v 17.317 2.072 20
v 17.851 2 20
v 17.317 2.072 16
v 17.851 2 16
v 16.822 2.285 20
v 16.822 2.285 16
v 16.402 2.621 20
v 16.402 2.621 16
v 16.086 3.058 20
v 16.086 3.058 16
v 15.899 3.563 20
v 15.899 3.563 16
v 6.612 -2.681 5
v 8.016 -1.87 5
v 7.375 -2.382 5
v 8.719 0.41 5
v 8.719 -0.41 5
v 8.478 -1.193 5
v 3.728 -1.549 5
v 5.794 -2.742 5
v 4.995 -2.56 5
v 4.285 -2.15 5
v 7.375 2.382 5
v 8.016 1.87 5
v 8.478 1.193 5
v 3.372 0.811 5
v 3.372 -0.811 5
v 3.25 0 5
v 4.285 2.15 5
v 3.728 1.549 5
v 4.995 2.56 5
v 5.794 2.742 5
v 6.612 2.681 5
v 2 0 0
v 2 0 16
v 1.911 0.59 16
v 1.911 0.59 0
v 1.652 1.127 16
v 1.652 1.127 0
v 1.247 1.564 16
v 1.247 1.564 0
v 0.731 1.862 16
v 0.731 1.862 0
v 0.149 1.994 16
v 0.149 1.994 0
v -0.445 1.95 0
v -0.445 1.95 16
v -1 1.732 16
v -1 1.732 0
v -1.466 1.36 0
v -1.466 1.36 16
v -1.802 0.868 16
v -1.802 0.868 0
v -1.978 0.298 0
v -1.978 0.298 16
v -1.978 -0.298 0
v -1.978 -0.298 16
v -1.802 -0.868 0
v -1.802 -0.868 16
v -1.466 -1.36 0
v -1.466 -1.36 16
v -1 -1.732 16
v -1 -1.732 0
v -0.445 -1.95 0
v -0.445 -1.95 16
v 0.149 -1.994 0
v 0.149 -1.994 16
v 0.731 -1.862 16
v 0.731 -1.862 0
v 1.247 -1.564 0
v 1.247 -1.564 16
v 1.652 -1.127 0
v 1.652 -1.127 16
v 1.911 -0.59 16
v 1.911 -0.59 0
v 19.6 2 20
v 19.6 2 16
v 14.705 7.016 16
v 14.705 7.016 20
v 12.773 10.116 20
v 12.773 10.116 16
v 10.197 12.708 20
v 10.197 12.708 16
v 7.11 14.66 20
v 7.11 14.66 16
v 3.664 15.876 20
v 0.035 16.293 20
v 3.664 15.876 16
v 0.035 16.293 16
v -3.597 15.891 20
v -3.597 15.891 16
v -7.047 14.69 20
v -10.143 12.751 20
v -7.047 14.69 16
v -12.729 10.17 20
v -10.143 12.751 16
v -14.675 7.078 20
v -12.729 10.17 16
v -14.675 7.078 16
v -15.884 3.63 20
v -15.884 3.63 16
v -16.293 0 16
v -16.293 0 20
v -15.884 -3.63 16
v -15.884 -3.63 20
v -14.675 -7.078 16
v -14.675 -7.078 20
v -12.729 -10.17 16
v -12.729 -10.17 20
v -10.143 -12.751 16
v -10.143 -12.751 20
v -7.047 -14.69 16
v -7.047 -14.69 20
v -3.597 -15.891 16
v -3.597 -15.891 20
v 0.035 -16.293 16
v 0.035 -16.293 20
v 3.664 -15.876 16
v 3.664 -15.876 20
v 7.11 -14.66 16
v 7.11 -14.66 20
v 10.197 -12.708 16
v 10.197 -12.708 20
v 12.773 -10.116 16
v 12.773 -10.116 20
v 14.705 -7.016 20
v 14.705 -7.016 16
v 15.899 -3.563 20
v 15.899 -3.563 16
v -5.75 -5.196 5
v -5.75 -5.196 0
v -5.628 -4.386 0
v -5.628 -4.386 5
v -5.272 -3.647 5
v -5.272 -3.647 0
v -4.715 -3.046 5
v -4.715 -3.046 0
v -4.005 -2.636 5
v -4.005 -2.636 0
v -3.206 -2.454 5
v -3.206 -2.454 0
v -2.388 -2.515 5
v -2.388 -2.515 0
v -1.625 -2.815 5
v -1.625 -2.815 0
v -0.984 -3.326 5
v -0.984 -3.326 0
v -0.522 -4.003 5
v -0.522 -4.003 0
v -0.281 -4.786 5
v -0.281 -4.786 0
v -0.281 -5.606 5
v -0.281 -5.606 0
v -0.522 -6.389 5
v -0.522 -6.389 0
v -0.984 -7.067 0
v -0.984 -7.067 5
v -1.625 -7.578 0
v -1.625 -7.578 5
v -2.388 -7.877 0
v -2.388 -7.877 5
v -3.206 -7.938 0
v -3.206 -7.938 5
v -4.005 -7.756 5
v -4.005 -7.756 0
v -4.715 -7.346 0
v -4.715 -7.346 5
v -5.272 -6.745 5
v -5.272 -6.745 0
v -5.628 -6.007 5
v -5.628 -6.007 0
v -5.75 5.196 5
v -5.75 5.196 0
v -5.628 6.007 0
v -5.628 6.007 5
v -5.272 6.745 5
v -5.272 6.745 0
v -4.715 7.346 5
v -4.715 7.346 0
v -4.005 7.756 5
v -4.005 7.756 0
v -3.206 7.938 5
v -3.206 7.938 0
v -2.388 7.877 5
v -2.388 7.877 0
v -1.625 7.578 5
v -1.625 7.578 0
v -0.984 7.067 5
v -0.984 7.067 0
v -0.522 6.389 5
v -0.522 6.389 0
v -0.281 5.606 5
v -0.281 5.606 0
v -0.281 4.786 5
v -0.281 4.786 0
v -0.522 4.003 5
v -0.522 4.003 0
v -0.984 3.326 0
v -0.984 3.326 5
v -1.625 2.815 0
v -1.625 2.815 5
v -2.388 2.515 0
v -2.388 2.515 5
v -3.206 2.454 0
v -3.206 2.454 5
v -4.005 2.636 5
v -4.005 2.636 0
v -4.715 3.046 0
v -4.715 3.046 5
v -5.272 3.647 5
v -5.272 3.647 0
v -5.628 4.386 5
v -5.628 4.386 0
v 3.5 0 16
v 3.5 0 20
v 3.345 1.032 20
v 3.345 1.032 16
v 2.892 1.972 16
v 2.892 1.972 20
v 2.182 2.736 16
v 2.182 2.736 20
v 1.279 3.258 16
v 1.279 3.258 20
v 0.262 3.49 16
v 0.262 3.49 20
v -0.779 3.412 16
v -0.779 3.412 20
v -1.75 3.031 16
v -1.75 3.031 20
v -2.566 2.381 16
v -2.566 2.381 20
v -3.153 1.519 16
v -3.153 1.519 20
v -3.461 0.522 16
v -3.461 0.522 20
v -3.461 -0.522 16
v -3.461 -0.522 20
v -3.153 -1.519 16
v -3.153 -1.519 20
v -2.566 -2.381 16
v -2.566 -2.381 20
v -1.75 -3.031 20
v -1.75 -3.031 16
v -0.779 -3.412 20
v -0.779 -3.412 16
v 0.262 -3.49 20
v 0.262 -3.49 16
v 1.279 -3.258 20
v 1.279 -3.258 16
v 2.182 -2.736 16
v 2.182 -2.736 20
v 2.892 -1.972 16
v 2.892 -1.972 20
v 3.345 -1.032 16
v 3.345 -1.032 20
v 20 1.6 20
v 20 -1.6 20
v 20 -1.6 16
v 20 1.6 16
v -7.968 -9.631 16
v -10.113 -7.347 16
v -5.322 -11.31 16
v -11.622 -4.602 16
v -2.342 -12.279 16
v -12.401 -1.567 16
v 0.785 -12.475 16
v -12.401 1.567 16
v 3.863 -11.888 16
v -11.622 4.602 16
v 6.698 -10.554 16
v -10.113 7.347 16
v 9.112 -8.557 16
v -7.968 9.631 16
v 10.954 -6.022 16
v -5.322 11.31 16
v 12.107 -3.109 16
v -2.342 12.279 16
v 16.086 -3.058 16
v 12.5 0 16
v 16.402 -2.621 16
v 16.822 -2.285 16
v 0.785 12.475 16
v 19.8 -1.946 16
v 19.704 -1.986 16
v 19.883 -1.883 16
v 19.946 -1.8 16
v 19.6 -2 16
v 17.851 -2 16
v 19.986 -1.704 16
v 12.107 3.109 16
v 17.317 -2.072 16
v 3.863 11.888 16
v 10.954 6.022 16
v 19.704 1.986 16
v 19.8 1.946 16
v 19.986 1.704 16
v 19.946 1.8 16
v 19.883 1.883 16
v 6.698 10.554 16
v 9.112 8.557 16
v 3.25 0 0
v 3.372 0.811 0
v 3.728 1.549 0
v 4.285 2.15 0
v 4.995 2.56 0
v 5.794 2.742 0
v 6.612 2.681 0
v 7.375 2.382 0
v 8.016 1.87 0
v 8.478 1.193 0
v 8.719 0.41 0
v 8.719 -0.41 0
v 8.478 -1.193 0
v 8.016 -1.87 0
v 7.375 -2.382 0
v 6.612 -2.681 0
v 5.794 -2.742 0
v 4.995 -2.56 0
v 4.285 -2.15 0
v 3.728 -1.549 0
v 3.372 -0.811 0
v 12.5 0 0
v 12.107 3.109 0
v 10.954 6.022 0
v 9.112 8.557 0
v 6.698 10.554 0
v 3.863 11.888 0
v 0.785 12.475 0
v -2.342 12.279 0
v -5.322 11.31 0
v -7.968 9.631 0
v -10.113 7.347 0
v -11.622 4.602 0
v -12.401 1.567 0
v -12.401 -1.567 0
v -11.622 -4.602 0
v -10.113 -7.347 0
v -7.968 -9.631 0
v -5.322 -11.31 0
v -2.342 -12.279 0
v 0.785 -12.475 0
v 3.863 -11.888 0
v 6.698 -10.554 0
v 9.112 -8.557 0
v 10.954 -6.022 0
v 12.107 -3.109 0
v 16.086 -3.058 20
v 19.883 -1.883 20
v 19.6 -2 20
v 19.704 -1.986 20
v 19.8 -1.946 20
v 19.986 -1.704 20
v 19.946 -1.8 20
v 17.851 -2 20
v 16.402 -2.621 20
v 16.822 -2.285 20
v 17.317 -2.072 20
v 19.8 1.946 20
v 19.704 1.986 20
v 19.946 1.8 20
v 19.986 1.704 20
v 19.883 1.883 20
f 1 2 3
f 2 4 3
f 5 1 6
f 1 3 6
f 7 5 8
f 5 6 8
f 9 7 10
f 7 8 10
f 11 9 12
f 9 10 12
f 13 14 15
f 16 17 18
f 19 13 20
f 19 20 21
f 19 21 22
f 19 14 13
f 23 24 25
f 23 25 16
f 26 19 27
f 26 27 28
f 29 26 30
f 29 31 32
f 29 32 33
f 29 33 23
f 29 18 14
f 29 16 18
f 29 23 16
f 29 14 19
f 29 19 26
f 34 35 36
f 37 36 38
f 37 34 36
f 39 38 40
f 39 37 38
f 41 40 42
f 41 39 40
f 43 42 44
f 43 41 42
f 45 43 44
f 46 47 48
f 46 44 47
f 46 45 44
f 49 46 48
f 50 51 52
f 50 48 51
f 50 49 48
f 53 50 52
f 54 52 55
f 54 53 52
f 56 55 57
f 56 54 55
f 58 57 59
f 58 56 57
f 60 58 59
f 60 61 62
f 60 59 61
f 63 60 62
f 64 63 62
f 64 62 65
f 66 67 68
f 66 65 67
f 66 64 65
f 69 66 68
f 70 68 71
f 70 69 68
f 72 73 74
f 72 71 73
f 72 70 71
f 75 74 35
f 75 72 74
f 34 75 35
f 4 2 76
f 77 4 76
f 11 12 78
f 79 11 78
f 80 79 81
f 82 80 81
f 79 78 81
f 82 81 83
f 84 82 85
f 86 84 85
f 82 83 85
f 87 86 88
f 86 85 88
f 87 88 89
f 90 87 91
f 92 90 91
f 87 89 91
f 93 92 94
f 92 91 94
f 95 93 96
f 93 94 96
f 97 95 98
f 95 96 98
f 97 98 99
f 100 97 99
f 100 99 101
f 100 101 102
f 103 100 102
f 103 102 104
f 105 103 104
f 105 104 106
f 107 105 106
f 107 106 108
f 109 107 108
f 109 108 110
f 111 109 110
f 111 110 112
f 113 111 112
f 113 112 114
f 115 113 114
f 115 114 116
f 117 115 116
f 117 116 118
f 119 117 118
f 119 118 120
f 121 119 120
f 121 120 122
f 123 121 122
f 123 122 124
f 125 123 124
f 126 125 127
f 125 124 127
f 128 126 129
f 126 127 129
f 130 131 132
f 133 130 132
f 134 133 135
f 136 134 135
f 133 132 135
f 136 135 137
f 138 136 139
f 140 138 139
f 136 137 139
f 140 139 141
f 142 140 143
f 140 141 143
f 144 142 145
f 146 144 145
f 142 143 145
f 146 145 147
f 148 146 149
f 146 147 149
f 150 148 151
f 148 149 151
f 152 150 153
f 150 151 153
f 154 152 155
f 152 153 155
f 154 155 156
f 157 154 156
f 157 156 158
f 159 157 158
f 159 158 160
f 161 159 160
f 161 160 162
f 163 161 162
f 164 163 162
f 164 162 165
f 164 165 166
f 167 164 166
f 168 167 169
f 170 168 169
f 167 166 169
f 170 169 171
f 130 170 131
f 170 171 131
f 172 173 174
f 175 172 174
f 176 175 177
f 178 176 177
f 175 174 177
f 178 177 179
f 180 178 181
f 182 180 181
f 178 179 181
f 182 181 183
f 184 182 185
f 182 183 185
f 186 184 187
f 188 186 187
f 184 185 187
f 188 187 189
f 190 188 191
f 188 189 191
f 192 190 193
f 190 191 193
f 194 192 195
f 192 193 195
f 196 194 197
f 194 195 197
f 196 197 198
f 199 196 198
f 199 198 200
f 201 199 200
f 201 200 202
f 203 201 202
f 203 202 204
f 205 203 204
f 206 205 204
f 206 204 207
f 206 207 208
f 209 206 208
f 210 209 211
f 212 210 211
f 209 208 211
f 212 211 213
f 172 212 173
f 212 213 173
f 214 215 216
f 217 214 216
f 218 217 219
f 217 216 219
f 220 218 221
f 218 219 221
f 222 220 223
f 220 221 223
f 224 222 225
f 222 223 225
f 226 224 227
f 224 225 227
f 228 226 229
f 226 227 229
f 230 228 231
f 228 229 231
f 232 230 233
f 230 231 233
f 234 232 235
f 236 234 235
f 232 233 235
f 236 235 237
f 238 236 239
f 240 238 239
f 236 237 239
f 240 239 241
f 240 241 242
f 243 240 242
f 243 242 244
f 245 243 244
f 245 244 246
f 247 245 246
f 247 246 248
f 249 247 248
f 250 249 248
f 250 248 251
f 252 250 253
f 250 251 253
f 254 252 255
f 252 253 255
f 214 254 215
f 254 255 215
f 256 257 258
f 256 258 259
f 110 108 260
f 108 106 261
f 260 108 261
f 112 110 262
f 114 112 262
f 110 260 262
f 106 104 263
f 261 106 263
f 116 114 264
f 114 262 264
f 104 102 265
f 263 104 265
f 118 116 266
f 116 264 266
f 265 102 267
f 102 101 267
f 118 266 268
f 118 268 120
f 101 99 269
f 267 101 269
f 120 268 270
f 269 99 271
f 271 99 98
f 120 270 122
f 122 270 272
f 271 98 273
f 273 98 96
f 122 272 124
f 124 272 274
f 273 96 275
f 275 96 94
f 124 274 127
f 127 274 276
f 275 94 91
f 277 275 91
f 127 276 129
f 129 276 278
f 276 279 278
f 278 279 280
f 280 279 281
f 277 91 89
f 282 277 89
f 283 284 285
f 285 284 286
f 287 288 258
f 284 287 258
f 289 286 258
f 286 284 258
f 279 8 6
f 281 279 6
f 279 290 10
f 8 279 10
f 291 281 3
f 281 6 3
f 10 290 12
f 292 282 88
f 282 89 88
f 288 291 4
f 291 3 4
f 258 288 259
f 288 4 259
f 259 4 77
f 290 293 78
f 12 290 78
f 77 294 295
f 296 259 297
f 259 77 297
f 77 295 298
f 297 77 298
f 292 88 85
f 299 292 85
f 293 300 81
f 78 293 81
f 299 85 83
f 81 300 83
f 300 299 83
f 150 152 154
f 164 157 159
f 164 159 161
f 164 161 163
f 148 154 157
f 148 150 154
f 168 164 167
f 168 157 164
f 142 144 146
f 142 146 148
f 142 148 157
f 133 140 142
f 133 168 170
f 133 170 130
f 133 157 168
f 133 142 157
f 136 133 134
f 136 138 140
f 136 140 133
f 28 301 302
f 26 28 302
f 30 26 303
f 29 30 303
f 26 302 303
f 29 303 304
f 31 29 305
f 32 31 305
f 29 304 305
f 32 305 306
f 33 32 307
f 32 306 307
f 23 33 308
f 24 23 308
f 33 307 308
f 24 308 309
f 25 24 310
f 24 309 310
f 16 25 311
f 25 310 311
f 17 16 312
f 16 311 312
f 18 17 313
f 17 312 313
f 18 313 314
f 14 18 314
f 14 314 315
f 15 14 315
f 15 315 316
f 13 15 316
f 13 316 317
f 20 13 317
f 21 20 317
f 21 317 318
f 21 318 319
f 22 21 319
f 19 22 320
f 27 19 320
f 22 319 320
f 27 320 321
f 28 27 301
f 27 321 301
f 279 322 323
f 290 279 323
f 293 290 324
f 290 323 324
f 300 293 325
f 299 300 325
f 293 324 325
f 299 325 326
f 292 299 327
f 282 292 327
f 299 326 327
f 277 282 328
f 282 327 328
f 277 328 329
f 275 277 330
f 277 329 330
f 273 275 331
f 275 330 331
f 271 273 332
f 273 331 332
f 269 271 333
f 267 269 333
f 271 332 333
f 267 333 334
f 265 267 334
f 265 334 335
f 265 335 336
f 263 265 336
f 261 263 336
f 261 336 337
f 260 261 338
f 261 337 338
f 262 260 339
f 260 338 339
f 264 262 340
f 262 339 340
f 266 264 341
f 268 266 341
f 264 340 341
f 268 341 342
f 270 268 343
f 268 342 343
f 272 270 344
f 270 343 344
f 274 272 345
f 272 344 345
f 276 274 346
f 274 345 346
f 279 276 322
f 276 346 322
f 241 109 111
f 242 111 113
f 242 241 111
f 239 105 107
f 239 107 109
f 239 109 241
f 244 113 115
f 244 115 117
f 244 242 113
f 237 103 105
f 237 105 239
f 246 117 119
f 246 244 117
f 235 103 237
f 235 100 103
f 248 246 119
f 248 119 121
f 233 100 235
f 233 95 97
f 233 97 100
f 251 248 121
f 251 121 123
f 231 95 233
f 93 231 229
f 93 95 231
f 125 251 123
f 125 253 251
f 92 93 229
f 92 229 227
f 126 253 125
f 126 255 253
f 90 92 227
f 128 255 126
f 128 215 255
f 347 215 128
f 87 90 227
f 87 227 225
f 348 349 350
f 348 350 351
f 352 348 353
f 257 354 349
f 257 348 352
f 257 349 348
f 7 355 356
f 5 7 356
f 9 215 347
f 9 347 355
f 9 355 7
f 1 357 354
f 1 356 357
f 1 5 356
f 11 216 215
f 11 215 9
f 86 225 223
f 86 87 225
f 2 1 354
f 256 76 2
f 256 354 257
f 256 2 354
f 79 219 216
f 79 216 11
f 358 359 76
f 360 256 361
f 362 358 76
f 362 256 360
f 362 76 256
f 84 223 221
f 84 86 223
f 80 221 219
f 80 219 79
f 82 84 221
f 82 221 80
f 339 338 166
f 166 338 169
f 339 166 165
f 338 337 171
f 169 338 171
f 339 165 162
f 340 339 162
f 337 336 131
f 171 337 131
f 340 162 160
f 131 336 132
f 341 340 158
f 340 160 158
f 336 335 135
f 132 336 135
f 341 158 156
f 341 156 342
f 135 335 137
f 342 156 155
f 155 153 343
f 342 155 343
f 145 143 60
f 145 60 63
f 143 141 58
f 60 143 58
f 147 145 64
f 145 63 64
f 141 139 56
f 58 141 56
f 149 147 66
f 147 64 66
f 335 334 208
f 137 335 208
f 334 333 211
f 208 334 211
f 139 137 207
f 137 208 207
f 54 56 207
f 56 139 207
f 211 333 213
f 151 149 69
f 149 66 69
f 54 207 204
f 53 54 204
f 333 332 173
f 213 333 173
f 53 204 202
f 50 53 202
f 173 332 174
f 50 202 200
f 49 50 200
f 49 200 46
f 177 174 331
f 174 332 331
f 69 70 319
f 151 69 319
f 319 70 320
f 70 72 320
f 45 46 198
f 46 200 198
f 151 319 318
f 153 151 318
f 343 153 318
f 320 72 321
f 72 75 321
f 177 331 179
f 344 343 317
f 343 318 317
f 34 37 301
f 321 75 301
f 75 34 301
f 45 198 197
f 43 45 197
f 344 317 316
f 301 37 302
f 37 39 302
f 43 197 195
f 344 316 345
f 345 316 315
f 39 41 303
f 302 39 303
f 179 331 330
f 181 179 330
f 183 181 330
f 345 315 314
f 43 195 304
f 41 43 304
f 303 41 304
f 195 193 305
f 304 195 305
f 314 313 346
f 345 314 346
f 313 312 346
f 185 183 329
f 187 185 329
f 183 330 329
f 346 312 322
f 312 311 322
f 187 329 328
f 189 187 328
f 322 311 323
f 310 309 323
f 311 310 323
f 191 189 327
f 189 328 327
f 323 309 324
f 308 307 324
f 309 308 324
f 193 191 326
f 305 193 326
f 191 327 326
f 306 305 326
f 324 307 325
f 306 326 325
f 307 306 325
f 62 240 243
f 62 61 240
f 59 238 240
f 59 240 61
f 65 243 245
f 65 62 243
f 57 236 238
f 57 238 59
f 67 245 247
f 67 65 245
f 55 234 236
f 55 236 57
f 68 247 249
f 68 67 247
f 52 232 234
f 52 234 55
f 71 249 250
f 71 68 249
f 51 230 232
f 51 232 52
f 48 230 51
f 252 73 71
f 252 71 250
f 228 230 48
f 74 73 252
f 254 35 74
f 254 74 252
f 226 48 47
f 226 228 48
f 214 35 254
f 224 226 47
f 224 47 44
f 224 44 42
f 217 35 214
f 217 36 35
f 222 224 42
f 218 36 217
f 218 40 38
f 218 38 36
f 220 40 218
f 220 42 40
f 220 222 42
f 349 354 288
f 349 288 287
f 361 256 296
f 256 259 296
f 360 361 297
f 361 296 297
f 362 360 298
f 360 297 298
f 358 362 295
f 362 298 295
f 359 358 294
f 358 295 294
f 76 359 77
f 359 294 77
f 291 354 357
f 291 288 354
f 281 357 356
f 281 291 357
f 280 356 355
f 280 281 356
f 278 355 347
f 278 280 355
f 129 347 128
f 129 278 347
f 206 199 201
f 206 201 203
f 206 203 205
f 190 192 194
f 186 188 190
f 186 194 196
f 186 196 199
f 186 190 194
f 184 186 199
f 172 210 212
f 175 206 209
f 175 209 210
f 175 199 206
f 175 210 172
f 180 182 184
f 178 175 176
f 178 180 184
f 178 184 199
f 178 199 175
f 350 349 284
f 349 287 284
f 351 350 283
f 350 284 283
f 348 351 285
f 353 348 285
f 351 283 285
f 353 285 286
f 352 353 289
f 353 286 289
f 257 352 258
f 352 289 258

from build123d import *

# Parameters (mm, degrees)
ESQUISSE1_R             = 12.5
ESQUISSE1_R_2           = 2
BOSS_EXTRU_1_DEPTH      = 16
ESQUISSE2_R             = 16.293222759
ESQUISSE2_R_2           = 2
BOSS_EXTRU_2_DEPTH      = 4
ESQUISSE3_R             = 3.5
ENL_V_MAT_EXTRU_1_DEPTH = 4
ESQUISSE4_W             = 7.413554481
ESQUISSE4_H             = 4
BOSS_EXTRU_3_DEPTH      = 4
CONG_1_R                = 2
CONG_2_R                = 0.4
ESQUISSE5_R             = 2.75
ENL_V_MAT_EXTRU_2_DEPTH = 5


with BuildPart() as part:
    # Esquisse1 → Boss.-Extru.1 (new body)
    with BuildSketch(Plane.XY):
        Circle(ESQUISSE1_R)
        Circle(ESQUISSE1_R_2, mode=Mode.SUBTRACT)
    extrude(amount=BOSS_EXTRU_1_DEPTH)

    # Esquisse2 → Boss.-Extru.2 (add)
    with BuildSketch(Plane.XY.offset(16)):
        Circle(ESQUISSE2_R)
        Circle(ESQUISSE2_R_2, mode=Mode.SUBTRACT)
    extrude(amount=BOSS_EXTRU_2_DEPTH)

    # Esquisse3 → Enlèv. mat.-Extru.1 (cut)
    with BuildSketch(Plane.XY.offset(20)):
        Circle(ESQUISSE3_R)
    extrude(amount=-ENL_V_MAT_EXTRU_1_DEPTH, mode=Mode.SUBTRACT)

    # Esquisse4 → Boss.-Extru.3 (add)
    with BuildSketch(Plane.XY.offset(20)):
        with Locations((16.29322276, 0)):
            Rectangle(ESQUISSE4_W, ESQUISSE4_H)
    extrude(amount=-BOSS_EXTRU_3_DEPTH)

    # Congé1
    cong_1_edges = [part.edges().sort_by_distance(p)[0] for p in [
        (16.170006428, -2, 18),
        (16.170006428, 2, 18),
    ]]
    fillet(cong_1_edges, radius=CONG_1_R)

    # Congé2
    cong_2_edges = [part.edges().sort_by_distance(p)[0] for p in [
        (20, -2, 18),
        (20, 2, 18),
    ]]
    fillet(cong_2_edges, radius=CONG_2_R)

    # Esquisse5 → Enlèv. mat.-Extru.2 (cut)
    with BuildSketch(Plane(origin=(0, 0, 0), x_dir=(-1, 0, 0), z_dir=(0, 0, -1))):
        with Locations((-6, 0)):
            Circle(ESQUISSE5_R)
        with Locations((3, 5.196152423)):
            Circle(ESQUISSE5_R)
        with Locations((3, -5.196152423)):
            Circle(ESQUISSE5_R)
    extrude(amount=-ENL_V_MAT_EXTRU_2_DEPTH, mode=Mode.SUBTRACT)


solid = part.part
